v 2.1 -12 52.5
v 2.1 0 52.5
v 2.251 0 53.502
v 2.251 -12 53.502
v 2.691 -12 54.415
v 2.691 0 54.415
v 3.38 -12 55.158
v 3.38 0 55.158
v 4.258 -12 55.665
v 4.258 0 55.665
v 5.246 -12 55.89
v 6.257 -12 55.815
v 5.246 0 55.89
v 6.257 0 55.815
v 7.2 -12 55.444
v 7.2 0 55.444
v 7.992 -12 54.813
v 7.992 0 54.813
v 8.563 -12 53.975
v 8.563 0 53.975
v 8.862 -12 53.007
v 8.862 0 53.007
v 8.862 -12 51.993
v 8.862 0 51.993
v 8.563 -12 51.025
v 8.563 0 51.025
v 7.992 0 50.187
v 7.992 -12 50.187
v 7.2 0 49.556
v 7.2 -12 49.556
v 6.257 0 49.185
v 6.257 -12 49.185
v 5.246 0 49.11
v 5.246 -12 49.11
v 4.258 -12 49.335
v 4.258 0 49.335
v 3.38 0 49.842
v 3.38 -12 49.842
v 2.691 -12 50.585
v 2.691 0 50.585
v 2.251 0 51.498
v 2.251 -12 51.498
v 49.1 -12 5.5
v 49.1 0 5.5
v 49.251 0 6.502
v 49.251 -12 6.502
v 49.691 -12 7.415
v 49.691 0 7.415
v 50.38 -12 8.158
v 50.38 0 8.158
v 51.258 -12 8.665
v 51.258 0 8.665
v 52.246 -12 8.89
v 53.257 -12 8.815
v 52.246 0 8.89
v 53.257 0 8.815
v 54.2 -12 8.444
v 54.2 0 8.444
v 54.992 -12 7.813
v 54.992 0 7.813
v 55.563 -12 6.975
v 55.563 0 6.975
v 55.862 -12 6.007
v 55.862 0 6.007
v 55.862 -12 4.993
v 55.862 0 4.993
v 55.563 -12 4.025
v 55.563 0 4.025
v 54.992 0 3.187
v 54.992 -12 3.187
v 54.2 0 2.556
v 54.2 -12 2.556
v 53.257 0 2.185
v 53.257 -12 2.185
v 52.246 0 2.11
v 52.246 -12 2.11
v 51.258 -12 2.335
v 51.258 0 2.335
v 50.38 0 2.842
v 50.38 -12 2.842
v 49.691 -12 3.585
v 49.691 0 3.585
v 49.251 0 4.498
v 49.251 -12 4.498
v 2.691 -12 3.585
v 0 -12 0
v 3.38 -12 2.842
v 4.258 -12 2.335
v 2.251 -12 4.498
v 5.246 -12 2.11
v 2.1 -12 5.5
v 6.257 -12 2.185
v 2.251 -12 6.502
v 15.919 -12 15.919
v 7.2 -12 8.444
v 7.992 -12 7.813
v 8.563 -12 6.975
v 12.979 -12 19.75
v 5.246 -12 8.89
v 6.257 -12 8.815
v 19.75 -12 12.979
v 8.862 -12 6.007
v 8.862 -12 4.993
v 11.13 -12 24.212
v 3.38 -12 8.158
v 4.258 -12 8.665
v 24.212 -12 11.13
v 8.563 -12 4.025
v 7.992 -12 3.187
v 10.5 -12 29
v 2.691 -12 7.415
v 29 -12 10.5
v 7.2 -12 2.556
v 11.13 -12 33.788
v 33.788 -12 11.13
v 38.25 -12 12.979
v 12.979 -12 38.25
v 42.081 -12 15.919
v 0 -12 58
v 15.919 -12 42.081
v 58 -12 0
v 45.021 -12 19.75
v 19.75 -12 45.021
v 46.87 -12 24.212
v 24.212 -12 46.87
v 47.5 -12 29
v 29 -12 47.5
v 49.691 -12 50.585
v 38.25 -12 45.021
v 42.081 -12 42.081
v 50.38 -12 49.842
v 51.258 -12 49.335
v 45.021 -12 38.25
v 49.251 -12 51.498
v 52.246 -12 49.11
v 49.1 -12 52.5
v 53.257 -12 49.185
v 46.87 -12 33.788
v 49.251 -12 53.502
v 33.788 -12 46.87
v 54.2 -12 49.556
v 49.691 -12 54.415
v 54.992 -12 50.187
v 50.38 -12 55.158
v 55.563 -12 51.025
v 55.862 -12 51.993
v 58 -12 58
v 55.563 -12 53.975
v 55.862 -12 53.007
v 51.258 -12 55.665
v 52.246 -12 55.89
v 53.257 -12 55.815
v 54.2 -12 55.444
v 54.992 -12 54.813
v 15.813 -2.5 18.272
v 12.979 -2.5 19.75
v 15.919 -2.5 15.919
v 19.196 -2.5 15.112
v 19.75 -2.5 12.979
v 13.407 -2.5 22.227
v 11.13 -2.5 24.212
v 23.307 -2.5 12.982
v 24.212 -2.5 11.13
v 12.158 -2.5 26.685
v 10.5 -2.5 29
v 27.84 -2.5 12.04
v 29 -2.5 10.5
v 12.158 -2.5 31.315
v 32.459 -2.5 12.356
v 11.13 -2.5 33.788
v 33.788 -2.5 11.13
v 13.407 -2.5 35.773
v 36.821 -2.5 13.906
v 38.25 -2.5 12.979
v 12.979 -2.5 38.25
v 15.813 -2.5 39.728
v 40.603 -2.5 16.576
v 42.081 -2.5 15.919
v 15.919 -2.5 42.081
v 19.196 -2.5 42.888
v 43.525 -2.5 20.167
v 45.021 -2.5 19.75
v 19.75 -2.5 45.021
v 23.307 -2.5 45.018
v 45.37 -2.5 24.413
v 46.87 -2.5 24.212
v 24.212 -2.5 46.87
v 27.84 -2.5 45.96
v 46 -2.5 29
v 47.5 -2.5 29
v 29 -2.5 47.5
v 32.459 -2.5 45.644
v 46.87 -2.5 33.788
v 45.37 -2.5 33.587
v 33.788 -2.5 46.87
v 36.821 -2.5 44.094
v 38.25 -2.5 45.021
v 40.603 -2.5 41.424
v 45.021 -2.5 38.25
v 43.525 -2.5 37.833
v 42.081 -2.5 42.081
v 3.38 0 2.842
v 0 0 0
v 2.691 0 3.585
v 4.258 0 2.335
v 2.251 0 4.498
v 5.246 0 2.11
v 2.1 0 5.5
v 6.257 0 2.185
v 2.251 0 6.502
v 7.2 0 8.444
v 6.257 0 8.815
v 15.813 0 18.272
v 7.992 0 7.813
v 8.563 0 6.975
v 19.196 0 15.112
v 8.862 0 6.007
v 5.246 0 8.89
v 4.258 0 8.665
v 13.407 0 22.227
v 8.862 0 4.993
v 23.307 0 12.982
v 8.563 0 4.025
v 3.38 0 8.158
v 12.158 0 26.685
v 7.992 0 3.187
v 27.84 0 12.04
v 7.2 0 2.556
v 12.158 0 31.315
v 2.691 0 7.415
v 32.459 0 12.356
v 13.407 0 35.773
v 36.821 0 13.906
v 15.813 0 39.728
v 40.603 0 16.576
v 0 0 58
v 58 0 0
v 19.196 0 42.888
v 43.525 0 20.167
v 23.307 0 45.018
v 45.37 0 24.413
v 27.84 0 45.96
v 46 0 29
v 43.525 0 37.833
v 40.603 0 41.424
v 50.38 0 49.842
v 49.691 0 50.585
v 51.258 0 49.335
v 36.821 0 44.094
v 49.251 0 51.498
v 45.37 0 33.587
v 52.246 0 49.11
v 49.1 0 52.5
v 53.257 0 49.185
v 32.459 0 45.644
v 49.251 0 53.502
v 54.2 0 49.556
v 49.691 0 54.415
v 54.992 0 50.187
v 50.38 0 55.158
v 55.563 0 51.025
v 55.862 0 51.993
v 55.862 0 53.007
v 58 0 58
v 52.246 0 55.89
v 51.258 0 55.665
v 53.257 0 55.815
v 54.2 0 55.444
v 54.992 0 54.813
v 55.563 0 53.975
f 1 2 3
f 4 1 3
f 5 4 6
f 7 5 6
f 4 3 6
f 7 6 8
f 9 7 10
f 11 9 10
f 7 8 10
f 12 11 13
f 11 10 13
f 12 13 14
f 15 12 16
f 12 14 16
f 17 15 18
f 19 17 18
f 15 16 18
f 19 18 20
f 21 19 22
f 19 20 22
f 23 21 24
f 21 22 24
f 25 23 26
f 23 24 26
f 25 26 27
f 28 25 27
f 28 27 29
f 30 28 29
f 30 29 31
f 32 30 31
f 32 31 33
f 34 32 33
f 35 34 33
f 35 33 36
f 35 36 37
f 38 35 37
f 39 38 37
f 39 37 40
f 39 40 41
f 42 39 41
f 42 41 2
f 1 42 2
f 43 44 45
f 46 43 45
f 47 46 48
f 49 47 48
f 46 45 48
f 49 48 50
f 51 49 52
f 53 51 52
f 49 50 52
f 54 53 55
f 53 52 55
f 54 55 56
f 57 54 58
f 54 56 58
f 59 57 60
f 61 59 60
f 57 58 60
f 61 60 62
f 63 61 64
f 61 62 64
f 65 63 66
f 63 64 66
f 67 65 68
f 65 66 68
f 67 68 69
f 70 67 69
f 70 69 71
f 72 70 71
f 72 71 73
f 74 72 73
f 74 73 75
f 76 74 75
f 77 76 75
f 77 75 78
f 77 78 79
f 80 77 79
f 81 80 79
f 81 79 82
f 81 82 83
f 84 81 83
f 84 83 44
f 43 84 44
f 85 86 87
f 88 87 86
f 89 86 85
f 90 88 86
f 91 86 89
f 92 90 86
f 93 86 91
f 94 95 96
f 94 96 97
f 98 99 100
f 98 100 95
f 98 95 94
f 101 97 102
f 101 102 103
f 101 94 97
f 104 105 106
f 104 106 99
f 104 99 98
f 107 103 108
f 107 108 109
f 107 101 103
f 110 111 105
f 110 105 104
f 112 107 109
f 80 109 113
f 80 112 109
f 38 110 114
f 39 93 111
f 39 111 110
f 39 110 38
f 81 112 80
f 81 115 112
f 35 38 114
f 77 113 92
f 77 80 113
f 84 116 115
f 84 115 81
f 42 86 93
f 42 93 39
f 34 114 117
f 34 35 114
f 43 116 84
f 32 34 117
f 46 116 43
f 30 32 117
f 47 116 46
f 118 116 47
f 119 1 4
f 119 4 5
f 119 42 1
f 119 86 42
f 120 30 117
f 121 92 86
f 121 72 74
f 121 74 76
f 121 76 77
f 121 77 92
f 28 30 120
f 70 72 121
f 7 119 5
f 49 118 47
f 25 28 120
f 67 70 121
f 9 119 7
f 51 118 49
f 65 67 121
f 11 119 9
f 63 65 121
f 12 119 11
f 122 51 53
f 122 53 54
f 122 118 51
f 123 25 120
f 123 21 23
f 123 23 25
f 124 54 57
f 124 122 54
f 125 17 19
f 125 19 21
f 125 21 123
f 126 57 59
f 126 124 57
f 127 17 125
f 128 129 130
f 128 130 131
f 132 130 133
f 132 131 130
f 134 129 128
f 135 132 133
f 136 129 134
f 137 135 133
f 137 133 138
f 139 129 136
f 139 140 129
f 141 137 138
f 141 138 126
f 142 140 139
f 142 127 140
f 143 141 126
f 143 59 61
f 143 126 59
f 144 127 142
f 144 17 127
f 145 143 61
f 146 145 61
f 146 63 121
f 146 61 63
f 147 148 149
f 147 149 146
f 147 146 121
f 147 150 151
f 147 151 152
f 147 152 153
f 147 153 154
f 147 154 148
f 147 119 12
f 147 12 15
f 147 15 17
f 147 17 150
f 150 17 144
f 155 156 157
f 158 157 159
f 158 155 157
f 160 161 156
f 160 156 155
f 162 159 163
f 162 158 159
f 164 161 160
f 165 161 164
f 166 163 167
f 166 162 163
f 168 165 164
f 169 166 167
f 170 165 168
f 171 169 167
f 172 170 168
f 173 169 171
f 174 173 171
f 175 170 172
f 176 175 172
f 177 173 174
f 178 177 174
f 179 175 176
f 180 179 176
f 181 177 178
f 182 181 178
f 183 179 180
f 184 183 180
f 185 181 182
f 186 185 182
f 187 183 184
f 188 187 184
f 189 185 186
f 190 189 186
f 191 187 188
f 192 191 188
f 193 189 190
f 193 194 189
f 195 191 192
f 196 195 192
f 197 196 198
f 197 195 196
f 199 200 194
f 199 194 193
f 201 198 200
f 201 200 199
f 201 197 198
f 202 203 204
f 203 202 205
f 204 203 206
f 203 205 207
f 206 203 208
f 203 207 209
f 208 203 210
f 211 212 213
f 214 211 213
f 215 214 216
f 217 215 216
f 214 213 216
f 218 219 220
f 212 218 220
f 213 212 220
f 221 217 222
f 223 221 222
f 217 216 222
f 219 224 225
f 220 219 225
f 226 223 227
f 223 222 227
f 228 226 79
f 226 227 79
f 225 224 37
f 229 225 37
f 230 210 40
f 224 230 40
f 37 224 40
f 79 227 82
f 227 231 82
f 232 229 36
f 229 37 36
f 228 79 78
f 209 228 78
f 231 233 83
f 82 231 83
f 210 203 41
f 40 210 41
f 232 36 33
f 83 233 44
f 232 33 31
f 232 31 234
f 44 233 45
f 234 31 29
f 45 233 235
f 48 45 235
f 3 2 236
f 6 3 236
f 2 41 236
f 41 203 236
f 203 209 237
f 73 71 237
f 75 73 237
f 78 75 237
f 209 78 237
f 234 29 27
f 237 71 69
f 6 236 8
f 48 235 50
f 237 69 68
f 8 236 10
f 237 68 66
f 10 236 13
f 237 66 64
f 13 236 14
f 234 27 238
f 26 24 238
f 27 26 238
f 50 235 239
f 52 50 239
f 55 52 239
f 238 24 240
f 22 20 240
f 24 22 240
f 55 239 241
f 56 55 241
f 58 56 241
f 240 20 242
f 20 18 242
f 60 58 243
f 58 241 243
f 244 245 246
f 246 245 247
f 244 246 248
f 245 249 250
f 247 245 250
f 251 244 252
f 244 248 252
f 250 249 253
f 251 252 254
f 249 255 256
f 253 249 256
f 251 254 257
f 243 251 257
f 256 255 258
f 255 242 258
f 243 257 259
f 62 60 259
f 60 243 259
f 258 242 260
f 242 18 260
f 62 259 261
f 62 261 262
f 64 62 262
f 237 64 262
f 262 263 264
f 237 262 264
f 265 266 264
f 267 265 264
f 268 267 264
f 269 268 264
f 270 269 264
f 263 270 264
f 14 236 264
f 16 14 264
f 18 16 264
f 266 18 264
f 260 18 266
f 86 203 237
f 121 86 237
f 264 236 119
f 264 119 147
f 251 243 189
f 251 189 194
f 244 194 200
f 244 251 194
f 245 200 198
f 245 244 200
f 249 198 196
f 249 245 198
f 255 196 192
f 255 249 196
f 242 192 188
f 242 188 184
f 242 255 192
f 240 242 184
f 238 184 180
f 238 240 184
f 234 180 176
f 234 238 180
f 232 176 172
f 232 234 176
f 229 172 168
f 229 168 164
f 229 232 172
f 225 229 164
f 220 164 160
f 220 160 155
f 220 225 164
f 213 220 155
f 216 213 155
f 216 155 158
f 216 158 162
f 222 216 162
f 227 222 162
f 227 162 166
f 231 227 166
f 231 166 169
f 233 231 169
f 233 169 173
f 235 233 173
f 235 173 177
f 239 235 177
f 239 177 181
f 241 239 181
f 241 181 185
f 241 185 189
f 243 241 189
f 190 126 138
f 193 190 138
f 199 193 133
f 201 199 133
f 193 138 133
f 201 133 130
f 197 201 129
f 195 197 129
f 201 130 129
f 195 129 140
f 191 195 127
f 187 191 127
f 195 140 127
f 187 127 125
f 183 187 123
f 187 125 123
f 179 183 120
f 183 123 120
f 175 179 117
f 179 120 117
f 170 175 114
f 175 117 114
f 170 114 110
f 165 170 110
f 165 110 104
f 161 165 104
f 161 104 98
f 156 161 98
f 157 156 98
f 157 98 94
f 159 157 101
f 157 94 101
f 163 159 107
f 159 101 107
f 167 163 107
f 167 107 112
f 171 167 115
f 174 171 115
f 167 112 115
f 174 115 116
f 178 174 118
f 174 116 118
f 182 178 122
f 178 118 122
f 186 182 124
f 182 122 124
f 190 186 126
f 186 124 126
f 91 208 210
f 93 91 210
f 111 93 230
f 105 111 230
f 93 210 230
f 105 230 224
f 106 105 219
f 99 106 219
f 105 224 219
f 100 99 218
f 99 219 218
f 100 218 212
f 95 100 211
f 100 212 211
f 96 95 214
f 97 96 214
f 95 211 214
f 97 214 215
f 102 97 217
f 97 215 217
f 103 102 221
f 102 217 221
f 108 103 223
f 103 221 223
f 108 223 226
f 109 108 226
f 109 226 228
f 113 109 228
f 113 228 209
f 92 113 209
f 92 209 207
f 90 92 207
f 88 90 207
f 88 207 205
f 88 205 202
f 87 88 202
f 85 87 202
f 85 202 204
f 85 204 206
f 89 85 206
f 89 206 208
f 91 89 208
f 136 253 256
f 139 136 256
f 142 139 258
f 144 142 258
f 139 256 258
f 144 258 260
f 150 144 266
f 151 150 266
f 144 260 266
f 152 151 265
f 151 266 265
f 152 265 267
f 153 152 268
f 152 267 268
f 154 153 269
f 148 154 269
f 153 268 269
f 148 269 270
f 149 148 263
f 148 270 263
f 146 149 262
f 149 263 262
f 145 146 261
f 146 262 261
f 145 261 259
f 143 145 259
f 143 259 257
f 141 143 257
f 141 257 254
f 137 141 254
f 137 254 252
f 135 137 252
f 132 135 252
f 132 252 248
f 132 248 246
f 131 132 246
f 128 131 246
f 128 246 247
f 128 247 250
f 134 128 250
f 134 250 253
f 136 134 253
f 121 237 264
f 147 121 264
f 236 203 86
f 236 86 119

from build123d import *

# Parameters (mm, degrees)
F0_W     = 58
F0_H     = 58
F0_R     = 17
F1_DEPTH = 12
F2_R     = 18.5
F2_R_2   = 17
F3_DEPTH = 9.5
F5_D     = 6.8


with BuildPart() as f1:
    # F0 (on Front) → F1 (new body)
    with BuildSketch(Plane.XZ):
        with Locations((29, 29)):
            Rectangle(F0_W, F0_H)
        with Locations((29, 29)):
            Circle(F0_R, mode=Mode.SUBTRACT)
    extrude(amount=F1_DEPTH)

    # F2 (on face) → F3 (cut)
    with BuildSketch(Plane.XZ.offset(12)):
        with Locations((29, 29)):
            Circle(F2_R)
        with Locations((29, 29)):
            Circle(F2_R_2, mode=Mode.SUBTRACT)
    extrude(amount=-F3_DEPTH, mode=Mode.SUBTRACT)

    # F5 (through all)
    with Locations(Plane.XZ.offset(12)):
        with Locations((5.5, 52.5), (52.5, 52.5), (52.5, 5.5), (5.5, 5.5)):
            Hole(F5_D / 2)


solid = f1.part
